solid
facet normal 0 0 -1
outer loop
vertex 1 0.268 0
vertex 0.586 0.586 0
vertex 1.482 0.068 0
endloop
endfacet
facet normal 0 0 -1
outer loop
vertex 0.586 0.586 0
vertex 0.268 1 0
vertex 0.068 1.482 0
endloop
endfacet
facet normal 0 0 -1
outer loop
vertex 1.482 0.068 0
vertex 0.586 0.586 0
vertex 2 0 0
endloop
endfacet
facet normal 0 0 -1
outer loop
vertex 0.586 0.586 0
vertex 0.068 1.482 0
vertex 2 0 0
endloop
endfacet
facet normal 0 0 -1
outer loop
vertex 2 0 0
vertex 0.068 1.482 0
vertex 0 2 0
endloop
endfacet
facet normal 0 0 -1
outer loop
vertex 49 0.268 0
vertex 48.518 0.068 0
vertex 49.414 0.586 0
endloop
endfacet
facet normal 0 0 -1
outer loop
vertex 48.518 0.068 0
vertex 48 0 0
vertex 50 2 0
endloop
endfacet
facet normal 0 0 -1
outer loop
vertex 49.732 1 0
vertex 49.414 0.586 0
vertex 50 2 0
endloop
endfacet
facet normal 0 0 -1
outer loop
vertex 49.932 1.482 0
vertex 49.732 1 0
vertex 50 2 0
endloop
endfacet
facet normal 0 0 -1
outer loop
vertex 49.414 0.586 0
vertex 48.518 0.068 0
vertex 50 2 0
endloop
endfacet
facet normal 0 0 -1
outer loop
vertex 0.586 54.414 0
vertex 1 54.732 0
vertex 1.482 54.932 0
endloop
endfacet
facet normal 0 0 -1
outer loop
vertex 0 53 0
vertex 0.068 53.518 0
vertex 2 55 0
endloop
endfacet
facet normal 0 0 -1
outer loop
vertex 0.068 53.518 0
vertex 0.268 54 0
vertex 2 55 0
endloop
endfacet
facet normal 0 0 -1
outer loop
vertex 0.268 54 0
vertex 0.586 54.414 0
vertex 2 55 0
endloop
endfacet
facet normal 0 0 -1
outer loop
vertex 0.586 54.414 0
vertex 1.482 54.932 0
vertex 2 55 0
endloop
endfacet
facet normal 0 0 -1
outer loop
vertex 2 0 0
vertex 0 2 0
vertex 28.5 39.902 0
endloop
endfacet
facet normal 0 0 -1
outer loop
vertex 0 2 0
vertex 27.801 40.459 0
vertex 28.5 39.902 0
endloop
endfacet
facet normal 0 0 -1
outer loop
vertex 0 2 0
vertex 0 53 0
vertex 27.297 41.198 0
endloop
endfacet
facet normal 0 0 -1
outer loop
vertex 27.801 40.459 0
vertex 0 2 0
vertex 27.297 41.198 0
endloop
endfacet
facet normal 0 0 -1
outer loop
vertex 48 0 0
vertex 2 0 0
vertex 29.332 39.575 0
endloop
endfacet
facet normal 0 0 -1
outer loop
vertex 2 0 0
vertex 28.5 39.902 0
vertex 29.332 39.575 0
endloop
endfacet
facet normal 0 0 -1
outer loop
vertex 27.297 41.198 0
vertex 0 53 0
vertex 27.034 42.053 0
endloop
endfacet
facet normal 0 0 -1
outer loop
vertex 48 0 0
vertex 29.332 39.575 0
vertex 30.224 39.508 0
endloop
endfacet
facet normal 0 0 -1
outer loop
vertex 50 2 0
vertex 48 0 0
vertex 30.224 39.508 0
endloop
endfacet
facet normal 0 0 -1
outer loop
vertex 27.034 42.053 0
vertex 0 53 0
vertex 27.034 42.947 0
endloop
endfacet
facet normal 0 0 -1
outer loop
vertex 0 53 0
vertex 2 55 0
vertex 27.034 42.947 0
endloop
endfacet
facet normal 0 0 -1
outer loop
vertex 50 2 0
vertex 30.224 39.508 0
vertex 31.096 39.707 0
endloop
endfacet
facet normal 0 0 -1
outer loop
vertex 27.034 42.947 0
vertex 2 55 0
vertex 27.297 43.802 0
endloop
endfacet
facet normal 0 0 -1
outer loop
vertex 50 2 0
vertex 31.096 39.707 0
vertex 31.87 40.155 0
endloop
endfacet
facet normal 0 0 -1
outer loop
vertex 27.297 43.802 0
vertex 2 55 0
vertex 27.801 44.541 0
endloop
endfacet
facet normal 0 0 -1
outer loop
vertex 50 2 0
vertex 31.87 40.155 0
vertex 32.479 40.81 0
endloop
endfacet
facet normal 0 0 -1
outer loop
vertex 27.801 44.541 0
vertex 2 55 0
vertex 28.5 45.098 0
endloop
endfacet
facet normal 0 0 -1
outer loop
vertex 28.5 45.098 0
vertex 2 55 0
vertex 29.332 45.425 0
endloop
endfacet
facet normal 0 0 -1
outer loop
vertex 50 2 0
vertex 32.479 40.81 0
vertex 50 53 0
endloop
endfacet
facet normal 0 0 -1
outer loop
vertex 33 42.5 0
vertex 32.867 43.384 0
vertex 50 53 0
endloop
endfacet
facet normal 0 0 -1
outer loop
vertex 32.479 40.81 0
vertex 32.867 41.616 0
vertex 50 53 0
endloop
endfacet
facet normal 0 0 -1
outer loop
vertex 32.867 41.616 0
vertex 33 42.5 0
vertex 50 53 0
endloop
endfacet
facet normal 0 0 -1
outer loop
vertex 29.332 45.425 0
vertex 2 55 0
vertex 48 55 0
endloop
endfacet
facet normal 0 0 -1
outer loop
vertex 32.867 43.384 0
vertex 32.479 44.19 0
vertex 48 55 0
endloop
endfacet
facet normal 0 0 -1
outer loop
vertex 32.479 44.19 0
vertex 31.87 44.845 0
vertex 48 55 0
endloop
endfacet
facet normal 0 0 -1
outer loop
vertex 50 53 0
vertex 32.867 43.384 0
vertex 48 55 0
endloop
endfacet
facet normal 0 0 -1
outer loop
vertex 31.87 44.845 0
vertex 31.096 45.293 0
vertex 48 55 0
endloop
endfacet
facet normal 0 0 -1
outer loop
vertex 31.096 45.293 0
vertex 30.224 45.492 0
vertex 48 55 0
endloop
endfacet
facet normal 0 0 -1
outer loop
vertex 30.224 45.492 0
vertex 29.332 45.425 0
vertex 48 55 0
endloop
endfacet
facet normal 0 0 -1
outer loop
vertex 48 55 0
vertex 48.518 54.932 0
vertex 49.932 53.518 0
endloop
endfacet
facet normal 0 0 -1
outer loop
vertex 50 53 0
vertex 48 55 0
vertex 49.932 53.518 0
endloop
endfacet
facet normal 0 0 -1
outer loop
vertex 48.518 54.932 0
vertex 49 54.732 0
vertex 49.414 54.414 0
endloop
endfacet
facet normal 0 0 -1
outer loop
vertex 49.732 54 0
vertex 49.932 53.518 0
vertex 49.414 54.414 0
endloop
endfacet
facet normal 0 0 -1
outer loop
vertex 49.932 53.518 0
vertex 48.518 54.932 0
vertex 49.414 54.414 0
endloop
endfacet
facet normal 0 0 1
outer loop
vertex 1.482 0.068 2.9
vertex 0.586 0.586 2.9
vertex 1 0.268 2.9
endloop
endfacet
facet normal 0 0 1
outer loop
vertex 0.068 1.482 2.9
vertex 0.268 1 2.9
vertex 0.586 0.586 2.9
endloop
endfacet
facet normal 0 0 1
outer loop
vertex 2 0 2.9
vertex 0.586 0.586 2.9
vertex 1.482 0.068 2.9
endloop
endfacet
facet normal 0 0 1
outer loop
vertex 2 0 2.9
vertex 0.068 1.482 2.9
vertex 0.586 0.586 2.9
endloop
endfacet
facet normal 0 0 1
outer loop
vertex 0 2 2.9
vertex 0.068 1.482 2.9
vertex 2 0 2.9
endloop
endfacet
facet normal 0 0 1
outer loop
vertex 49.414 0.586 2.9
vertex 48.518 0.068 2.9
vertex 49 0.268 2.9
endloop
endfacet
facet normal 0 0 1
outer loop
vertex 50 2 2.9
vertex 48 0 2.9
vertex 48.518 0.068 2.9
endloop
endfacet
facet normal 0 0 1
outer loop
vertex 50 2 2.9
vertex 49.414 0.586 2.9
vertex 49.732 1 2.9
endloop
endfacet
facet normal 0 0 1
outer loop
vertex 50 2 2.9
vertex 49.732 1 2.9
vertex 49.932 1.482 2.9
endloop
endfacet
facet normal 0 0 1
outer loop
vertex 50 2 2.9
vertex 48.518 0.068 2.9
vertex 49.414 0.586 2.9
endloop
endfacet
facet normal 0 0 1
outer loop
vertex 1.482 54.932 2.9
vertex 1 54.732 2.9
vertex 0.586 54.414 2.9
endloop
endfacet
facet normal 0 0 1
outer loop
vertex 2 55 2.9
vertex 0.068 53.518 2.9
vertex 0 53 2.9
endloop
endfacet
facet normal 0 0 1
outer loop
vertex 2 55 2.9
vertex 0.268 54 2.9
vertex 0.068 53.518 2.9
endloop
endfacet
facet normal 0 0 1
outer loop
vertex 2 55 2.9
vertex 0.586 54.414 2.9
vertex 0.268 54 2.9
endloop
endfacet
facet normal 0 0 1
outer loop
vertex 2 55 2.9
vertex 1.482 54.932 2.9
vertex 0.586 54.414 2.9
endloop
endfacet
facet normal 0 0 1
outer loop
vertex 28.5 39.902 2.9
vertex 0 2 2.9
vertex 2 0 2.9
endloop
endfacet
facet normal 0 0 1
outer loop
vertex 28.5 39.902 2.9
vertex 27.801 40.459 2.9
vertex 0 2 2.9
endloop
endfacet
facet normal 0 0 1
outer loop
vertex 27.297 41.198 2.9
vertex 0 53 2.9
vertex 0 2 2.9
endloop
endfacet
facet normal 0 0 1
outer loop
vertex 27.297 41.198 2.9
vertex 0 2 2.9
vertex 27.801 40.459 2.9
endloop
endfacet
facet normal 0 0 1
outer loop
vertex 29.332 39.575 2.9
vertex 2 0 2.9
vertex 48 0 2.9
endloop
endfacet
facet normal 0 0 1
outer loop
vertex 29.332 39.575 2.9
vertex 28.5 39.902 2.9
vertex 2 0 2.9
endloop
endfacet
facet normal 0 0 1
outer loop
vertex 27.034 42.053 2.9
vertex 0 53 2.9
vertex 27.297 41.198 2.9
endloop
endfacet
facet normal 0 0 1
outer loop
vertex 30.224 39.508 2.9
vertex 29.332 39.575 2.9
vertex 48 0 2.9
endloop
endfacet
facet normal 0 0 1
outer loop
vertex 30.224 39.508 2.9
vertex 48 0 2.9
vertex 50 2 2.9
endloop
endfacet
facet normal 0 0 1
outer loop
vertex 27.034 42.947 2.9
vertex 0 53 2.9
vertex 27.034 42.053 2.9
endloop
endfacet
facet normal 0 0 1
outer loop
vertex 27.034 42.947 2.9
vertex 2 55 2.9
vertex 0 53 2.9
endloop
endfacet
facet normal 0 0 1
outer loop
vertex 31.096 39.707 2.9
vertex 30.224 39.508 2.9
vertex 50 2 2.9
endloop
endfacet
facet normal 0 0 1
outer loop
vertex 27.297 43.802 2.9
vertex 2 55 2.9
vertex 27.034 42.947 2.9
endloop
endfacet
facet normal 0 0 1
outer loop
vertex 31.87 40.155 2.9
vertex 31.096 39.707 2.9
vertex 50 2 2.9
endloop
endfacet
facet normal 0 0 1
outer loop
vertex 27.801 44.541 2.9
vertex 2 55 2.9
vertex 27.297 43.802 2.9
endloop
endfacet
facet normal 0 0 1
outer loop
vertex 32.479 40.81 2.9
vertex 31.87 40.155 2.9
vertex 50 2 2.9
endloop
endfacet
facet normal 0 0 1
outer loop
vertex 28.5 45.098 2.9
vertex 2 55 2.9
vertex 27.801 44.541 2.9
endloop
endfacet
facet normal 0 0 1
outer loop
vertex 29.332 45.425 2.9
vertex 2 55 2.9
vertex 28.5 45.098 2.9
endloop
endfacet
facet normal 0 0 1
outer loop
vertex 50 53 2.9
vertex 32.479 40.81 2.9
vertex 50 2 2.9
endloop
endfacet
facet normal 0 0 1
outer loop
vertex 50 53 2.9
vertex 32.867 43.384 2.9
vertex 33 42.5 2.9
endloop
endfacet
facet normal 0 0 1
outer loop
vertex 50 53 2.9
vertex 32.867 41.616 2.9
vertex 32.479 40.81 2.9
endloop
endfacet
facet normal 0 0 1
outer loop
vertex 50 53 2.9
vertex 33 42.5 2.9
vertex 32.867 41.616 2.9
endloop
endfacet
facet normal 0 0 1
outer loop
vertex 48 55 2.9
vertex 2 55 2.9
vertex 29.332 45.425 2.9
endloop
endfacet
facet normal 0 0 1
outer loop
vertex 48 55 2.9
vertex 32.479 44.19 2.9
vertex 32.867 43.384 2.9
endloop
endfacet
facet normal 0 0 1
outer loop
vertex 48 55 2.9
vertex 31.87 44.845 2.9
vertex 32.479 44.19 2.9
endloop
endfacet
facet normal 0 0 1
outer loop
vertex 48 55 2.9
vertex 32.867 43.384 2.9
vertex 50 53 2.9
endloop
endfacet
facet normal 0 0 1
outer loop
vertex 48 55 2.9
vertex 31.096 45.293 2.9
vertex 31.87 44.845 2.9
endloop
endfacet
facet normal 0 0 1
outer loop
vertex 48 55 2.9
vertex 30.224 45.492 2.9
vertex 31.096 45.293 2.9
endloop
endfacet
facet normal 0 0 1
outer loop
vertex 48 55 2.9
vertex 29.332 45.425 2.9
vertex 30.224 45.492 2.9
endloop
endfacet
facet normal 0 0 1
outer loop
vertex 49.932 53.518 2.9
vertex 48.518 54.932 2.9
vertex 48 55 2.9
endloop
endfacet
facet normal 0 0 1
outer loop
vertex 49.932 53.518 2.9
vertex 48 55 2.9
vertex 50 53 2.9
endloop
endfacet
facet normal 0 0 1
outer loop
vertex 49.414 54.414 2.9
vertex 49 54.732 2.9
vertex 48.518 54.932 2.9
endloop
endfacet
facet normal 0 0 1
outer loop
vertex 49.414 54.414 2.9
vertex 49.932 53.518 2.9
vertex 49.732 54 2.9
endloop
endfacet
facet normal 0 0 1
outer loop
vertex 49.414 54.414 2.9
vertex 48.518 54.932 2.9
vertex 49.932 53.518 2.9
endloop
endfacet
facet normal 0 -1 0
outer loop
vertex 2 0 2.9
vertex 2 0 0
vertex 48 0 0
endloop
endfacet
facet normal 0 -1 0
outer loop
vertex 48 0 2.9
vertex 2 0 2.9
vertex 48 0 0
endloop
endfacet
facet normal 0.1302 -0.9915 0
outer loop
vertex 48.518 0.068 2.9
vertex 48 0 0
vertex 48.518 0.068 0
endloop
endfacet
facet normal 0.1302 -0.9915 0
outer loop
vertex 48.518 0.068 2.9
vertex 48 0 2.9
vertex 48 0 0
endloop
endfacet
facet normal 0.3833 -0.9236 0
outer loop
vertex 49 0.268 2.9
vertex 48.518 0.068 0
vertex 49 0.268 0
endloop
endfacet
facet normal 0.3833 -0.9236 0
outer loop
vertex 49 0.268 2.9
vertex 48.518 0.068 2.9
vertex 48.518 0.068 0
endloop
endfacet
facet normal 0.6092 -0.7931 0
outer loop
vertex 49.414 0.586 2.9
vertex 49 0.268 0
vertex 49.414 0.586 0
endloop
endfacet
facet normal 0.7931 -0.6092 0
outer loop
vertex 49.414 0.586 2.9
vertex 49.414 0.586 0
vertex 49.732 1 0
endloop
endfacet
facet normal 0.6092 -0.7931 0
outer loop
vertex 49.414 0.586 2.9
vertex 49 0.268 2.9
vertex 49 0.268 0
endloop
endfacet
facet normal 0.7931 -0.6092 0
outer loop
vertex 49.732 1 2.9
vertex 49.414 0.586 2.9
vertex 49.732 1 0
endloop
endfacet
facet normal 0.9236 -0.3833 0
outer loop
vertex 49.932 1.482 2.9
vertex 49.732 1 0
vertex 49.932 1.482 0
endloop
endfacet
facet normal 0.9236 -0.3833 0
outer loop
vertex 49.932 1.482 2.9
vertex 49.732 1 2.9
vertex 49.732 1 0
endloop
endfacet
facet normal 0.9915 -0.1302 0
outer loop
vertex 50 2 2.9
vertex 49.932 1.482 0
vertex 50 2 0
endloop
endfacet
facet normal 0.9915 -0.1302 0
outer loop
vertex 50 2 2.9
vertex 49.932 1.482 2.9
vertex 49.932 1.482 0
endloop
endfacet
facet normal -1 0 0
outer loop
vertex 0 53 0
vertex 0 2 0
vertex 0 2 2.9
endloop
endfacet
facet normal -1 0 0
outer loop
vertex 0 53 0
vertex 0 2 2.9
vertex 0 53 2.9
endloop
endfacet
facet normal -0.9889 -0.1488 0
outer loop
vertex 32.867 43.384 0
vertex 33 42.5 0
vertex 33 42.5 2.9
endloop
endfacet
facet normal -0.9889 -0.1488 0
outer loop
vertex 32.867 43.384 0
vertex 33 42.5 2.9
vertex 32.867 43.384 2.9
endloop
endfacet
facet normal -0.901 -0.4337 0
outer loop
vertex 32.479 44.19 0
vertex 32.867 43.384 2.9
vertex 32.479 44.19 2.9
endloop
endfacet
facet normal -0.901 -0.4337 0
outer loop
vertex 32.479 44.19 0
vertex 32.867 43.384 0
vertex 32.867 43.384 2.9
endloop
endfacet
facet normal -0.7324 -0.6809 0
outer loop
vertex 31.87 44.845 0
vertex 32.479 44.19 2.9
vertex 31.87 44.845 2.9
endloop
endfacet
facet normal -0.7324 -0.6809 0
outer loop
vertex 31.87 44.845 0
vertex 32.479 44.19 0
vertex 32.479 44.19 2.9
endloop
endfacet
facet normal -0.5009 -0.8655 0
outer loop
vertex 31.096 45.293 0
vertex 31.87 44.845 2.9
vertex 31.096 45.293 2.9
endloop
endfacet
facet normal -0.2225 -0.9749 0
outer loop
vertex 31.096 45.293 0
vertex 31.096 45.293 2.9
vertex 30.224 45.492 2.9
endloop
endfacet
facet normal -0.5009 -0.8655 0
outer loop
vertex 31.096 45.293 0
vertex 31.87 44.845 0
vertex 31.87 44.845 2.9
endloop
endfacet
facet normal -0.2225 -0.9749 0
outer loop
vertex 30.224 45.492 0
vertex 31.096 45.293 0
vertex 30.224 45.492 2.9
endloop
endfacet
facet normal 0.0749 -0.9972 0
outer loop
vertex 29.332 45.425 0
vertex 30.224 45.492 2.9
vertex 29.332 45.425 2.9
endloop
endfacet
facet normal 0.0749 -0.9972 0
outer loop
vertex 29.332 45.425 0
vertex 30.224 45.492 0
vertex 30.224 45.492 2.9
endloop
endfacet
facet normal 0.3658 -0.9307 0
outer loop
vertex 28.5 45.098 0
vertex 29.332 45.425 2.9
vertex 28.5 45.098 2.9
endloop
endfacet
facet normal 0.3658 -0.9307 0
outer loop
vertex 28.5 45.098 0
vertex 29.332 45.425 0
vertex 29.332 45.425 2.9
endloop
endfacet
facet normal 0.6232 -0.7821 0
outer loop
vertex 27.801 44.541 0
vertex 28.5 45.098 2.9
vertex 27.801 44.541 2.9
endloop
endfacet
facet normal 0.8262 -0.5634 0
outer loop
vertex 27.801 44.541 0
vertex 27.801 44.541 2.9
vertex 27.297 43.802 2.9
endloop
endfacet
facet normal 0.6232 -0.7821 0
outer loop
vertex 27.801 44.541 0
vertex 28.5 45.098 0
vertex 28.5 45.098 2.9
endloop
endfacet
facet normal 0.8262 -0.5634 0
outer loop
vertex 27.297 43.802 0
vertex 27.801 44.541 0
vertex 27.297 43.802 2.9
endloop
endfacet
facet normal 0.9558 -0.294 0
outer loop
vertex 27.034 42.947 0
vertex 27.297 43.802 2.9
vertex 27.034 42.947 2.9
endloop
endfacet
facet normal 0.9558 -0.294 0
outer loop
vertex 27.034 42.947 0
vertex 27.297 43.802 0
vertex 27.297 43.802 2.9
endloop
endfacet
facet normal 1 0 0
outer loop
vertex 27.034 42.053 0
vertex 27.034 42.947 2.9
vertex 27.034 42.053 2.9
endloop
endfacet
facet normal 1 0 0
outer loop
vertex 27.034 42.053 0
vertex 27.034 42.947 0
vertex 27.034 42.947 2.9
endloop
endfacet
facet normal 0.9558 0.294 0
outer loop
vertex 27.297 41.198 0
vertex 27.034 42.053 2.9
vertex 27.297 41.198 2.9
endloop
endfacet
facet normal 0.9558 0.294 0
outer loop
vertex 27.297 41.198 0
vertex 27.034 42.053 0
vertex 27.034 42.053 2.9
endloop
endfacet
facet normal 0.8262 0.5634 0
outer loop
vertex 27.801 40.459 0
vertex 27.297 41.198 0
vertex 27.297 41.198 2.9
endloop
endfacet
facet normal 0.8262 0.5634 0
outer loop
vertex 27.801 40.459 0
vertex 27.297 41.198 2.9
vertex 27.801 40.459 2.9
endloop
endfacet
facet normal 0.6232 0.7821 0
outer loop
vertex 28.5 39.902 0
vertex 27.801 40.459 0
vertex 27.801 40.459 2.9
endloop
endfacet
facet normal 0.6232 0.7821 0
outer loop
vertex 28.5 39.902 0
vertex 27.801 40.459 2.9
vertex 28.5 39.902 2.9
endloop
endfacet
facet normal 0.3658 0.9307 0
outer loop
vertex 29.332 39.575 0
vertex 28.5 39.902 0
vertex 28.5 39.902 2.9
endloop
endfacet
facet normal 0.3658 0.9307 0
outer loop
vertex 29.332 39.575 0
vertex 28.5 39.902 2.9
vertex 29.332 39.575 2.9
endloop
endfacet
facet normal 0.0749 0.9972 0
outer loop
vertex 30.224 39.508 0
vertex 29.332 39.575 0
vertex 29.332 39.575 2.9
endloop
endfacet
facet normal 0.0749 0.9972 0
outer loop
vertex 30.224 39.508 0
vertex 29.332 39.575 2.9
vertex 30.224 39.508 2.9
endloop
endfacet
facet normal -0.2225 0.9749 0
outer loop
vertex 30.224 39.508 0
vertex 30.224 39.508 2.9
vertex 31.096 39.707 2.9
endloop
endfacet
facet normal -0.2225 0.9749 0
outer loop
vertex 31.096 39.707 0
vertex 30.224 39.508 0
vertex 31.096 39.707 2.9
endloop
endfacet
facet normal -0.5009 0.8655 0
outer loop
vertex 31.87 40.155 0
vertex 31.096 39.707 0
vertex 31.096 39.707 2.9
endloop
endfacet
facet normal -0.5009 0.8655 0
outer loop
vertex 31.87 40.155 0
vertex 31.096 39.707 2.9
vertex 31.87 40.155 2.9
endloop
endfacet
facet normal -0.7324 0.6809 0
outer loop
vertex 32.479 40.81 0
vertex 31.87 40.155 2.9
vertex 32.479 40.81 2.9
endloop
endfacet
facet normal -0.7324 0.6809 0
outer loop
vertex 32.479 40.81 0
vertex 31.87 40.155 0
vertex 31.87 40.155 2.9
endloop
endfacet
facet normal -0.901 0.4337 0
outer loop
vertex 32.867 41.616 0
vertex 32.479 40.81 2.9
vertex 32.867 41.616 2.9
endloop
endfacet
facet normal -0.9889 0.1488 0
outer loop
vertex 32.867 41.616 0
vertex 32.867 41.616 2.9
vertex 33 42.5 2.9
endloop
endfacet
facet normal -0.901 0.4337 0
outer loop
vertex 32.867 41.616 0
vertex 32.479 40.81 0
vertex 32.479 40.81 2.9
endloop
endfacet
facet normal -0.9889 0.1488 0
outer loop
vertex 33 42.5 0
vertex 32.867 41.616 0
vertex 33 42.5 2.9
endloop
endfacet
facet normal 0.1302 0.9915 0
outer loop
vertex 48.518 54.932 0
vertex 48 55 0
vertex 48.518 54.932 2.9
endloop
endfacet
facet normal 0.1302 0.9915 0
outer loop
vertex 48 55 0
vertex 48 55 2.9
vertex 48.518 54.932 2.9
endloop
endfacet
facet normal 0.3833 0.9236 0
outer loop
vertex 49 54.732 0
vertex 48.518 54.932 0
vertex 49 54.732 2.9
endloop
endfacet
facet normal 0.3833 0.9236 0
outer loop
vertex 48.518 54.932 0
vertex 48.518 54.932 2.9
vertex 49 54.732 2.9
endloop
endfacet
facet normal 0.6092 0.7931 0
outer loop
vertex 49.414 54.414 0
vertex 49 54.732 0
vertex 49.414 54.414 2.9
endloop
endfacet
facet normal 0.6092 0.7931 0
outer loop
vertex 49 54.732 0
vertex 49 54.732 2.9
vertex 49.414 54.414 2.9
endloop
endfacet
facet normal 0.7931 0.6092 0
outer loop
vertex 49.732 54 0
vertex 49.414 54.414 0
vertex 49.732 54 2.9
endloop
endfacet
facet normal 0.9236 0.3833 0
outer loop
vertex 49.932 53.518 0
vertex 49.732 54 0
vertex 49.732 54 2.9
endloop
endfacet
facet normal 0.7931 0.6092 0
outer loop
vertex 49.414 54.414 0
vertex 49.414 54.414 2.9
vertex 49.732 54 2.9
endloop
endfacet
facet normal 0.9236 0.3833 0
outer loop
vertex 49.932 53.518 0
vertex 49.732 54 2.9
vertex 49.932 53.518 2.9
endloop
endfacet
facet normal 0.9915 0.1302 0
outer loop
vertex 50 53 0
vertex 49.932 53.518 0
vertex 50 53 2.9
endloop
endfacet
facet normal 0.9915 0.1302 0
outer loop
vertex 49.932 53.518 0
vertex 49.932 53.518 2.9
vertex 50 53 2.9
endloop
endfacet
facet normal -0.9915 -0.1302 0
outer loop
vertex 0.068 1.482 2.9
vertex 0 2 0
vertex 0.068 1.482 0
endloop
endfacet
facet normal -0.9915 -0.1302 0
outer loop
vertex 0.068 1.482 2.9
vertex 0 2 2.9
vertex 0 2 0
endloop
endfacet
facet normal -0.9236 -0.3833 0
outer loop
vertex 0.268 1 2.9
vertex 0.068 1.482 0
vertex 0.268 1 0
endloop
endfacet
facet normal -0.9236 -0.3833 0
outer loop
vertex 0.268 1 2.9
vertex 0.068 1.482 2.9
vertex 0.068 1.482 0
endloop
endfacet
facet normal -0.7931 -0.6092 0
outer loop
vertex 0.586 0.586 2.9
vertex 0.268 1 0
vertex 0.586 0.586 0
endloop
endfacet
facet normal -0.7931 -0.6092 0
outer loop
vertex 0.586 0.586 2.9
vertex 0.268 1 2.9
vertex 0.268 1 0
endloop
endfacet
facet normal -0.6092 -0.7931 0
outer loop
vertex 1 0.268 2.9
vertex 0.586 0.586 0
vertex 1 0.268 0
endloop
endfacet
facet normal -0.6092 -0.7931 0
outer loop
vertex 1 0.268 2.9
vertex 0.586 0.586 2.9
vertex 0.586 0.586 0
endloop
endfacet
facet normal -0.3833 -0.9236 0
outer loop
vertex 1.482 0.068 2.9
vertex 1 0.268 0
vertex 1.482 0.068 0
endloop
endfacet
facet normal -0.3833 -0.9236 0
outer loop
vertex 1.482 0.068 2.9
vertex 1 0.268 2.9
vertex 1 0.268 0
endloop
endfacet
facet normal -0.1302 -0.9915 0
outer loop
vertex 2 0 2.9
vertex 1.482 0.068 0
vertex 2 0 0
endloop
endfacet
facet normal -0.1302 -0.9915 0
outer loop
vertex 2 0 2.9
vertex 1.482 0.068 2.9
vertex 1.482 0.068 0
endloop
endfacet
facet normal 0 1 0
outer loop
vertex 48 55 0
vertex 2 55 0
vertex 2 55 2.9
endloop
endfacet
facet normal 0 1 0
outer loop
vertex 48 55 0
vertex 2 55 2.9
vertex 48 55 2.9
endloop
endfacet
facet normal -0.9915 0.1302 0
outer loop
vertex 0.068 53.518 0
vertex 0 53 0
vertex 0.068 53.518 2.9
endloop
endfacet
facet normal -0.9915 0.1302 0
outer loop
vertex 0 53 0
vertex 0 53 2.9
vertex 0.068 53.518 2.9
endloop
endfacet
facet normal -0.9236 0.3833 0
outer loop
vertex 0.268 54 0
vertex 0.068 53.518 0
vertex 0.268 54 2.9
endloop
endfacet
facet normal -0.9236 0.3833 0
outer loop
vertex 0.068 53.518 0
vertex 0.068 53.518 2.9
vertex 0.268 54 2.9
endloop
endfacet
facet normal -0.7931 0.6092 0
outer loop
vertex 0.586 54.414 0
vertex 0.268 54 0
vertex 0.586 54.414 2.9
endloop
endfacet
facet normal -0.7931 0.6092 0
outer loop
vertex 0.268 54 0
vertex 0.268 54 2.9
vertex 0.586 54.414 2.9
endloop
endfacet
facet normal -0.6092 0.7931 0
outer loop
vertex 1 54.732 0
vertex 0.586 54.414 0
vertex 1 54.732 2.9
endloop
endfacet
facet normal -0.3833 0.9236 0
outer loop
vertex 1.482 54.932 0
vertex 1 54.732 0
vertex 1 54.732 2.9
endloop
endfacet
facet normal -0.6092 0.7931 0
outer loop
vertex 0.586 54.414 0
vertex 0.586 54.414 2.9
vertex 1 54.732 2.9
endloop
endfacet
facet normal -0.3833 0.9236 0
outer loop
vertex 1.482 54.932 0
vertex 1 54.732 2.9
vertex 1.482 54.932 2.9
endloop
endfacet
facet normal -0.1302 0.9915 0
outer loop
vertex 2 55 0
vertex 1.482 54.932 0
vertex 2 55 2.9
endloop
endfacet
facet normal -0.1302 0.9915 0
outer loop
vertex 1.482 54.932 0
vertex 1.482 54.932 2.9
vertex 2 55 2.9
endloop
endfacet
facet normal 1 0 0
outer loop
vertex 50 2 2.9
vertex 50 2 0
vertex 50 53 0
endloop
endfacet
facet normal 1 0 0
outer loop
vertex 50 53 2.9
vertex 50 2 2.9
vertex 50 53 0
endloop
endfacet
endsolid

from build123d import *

# Parameters (mm, degrees)
CROQUIS1_W              = 50
CROQUIS1_H              = 55
CROQUIS1_R              = 3
SALIENTE_EXTRUIR1_DEPTH = 2.9
REDONDEO1_R             = 2
REDONDEO2_R             = 2


with BuildPart() as part:
    # Croquis1 → Saliente-Extruir1 (new body)
    with BuildSketch(Plane.XY):
        with Locations((25, 27.5)):
            Rectangle(CROQUIS1_W, CROQUIS1_H)
        with Locations((30, 42.5)):
            Circle(CROQUIS1_R, mode=Mode.SUBTRACT)
    extrude(amount=SALIENTE_EXTRUIR1_DEPTH)

    # Redondeo1
    redondeo1_edges = [part.edges().sort_by_distance(p)[0] for p in [
        (50, 0, 1.45),
        (0, 0, 1.45),
    ]]
    fillet(redondeo1_edges, radius=REDONDEO1_R)

    # Redondeo2
    redondeo2_edges = [part.edges().sort_by_distance(p)[0] for p in [
        (0, 55, 1.45),
        (50, 55, 1.45),
    ]]
    fillet(redondeo2_edges, radius=REDONDEO2_R)


solid = part.part
